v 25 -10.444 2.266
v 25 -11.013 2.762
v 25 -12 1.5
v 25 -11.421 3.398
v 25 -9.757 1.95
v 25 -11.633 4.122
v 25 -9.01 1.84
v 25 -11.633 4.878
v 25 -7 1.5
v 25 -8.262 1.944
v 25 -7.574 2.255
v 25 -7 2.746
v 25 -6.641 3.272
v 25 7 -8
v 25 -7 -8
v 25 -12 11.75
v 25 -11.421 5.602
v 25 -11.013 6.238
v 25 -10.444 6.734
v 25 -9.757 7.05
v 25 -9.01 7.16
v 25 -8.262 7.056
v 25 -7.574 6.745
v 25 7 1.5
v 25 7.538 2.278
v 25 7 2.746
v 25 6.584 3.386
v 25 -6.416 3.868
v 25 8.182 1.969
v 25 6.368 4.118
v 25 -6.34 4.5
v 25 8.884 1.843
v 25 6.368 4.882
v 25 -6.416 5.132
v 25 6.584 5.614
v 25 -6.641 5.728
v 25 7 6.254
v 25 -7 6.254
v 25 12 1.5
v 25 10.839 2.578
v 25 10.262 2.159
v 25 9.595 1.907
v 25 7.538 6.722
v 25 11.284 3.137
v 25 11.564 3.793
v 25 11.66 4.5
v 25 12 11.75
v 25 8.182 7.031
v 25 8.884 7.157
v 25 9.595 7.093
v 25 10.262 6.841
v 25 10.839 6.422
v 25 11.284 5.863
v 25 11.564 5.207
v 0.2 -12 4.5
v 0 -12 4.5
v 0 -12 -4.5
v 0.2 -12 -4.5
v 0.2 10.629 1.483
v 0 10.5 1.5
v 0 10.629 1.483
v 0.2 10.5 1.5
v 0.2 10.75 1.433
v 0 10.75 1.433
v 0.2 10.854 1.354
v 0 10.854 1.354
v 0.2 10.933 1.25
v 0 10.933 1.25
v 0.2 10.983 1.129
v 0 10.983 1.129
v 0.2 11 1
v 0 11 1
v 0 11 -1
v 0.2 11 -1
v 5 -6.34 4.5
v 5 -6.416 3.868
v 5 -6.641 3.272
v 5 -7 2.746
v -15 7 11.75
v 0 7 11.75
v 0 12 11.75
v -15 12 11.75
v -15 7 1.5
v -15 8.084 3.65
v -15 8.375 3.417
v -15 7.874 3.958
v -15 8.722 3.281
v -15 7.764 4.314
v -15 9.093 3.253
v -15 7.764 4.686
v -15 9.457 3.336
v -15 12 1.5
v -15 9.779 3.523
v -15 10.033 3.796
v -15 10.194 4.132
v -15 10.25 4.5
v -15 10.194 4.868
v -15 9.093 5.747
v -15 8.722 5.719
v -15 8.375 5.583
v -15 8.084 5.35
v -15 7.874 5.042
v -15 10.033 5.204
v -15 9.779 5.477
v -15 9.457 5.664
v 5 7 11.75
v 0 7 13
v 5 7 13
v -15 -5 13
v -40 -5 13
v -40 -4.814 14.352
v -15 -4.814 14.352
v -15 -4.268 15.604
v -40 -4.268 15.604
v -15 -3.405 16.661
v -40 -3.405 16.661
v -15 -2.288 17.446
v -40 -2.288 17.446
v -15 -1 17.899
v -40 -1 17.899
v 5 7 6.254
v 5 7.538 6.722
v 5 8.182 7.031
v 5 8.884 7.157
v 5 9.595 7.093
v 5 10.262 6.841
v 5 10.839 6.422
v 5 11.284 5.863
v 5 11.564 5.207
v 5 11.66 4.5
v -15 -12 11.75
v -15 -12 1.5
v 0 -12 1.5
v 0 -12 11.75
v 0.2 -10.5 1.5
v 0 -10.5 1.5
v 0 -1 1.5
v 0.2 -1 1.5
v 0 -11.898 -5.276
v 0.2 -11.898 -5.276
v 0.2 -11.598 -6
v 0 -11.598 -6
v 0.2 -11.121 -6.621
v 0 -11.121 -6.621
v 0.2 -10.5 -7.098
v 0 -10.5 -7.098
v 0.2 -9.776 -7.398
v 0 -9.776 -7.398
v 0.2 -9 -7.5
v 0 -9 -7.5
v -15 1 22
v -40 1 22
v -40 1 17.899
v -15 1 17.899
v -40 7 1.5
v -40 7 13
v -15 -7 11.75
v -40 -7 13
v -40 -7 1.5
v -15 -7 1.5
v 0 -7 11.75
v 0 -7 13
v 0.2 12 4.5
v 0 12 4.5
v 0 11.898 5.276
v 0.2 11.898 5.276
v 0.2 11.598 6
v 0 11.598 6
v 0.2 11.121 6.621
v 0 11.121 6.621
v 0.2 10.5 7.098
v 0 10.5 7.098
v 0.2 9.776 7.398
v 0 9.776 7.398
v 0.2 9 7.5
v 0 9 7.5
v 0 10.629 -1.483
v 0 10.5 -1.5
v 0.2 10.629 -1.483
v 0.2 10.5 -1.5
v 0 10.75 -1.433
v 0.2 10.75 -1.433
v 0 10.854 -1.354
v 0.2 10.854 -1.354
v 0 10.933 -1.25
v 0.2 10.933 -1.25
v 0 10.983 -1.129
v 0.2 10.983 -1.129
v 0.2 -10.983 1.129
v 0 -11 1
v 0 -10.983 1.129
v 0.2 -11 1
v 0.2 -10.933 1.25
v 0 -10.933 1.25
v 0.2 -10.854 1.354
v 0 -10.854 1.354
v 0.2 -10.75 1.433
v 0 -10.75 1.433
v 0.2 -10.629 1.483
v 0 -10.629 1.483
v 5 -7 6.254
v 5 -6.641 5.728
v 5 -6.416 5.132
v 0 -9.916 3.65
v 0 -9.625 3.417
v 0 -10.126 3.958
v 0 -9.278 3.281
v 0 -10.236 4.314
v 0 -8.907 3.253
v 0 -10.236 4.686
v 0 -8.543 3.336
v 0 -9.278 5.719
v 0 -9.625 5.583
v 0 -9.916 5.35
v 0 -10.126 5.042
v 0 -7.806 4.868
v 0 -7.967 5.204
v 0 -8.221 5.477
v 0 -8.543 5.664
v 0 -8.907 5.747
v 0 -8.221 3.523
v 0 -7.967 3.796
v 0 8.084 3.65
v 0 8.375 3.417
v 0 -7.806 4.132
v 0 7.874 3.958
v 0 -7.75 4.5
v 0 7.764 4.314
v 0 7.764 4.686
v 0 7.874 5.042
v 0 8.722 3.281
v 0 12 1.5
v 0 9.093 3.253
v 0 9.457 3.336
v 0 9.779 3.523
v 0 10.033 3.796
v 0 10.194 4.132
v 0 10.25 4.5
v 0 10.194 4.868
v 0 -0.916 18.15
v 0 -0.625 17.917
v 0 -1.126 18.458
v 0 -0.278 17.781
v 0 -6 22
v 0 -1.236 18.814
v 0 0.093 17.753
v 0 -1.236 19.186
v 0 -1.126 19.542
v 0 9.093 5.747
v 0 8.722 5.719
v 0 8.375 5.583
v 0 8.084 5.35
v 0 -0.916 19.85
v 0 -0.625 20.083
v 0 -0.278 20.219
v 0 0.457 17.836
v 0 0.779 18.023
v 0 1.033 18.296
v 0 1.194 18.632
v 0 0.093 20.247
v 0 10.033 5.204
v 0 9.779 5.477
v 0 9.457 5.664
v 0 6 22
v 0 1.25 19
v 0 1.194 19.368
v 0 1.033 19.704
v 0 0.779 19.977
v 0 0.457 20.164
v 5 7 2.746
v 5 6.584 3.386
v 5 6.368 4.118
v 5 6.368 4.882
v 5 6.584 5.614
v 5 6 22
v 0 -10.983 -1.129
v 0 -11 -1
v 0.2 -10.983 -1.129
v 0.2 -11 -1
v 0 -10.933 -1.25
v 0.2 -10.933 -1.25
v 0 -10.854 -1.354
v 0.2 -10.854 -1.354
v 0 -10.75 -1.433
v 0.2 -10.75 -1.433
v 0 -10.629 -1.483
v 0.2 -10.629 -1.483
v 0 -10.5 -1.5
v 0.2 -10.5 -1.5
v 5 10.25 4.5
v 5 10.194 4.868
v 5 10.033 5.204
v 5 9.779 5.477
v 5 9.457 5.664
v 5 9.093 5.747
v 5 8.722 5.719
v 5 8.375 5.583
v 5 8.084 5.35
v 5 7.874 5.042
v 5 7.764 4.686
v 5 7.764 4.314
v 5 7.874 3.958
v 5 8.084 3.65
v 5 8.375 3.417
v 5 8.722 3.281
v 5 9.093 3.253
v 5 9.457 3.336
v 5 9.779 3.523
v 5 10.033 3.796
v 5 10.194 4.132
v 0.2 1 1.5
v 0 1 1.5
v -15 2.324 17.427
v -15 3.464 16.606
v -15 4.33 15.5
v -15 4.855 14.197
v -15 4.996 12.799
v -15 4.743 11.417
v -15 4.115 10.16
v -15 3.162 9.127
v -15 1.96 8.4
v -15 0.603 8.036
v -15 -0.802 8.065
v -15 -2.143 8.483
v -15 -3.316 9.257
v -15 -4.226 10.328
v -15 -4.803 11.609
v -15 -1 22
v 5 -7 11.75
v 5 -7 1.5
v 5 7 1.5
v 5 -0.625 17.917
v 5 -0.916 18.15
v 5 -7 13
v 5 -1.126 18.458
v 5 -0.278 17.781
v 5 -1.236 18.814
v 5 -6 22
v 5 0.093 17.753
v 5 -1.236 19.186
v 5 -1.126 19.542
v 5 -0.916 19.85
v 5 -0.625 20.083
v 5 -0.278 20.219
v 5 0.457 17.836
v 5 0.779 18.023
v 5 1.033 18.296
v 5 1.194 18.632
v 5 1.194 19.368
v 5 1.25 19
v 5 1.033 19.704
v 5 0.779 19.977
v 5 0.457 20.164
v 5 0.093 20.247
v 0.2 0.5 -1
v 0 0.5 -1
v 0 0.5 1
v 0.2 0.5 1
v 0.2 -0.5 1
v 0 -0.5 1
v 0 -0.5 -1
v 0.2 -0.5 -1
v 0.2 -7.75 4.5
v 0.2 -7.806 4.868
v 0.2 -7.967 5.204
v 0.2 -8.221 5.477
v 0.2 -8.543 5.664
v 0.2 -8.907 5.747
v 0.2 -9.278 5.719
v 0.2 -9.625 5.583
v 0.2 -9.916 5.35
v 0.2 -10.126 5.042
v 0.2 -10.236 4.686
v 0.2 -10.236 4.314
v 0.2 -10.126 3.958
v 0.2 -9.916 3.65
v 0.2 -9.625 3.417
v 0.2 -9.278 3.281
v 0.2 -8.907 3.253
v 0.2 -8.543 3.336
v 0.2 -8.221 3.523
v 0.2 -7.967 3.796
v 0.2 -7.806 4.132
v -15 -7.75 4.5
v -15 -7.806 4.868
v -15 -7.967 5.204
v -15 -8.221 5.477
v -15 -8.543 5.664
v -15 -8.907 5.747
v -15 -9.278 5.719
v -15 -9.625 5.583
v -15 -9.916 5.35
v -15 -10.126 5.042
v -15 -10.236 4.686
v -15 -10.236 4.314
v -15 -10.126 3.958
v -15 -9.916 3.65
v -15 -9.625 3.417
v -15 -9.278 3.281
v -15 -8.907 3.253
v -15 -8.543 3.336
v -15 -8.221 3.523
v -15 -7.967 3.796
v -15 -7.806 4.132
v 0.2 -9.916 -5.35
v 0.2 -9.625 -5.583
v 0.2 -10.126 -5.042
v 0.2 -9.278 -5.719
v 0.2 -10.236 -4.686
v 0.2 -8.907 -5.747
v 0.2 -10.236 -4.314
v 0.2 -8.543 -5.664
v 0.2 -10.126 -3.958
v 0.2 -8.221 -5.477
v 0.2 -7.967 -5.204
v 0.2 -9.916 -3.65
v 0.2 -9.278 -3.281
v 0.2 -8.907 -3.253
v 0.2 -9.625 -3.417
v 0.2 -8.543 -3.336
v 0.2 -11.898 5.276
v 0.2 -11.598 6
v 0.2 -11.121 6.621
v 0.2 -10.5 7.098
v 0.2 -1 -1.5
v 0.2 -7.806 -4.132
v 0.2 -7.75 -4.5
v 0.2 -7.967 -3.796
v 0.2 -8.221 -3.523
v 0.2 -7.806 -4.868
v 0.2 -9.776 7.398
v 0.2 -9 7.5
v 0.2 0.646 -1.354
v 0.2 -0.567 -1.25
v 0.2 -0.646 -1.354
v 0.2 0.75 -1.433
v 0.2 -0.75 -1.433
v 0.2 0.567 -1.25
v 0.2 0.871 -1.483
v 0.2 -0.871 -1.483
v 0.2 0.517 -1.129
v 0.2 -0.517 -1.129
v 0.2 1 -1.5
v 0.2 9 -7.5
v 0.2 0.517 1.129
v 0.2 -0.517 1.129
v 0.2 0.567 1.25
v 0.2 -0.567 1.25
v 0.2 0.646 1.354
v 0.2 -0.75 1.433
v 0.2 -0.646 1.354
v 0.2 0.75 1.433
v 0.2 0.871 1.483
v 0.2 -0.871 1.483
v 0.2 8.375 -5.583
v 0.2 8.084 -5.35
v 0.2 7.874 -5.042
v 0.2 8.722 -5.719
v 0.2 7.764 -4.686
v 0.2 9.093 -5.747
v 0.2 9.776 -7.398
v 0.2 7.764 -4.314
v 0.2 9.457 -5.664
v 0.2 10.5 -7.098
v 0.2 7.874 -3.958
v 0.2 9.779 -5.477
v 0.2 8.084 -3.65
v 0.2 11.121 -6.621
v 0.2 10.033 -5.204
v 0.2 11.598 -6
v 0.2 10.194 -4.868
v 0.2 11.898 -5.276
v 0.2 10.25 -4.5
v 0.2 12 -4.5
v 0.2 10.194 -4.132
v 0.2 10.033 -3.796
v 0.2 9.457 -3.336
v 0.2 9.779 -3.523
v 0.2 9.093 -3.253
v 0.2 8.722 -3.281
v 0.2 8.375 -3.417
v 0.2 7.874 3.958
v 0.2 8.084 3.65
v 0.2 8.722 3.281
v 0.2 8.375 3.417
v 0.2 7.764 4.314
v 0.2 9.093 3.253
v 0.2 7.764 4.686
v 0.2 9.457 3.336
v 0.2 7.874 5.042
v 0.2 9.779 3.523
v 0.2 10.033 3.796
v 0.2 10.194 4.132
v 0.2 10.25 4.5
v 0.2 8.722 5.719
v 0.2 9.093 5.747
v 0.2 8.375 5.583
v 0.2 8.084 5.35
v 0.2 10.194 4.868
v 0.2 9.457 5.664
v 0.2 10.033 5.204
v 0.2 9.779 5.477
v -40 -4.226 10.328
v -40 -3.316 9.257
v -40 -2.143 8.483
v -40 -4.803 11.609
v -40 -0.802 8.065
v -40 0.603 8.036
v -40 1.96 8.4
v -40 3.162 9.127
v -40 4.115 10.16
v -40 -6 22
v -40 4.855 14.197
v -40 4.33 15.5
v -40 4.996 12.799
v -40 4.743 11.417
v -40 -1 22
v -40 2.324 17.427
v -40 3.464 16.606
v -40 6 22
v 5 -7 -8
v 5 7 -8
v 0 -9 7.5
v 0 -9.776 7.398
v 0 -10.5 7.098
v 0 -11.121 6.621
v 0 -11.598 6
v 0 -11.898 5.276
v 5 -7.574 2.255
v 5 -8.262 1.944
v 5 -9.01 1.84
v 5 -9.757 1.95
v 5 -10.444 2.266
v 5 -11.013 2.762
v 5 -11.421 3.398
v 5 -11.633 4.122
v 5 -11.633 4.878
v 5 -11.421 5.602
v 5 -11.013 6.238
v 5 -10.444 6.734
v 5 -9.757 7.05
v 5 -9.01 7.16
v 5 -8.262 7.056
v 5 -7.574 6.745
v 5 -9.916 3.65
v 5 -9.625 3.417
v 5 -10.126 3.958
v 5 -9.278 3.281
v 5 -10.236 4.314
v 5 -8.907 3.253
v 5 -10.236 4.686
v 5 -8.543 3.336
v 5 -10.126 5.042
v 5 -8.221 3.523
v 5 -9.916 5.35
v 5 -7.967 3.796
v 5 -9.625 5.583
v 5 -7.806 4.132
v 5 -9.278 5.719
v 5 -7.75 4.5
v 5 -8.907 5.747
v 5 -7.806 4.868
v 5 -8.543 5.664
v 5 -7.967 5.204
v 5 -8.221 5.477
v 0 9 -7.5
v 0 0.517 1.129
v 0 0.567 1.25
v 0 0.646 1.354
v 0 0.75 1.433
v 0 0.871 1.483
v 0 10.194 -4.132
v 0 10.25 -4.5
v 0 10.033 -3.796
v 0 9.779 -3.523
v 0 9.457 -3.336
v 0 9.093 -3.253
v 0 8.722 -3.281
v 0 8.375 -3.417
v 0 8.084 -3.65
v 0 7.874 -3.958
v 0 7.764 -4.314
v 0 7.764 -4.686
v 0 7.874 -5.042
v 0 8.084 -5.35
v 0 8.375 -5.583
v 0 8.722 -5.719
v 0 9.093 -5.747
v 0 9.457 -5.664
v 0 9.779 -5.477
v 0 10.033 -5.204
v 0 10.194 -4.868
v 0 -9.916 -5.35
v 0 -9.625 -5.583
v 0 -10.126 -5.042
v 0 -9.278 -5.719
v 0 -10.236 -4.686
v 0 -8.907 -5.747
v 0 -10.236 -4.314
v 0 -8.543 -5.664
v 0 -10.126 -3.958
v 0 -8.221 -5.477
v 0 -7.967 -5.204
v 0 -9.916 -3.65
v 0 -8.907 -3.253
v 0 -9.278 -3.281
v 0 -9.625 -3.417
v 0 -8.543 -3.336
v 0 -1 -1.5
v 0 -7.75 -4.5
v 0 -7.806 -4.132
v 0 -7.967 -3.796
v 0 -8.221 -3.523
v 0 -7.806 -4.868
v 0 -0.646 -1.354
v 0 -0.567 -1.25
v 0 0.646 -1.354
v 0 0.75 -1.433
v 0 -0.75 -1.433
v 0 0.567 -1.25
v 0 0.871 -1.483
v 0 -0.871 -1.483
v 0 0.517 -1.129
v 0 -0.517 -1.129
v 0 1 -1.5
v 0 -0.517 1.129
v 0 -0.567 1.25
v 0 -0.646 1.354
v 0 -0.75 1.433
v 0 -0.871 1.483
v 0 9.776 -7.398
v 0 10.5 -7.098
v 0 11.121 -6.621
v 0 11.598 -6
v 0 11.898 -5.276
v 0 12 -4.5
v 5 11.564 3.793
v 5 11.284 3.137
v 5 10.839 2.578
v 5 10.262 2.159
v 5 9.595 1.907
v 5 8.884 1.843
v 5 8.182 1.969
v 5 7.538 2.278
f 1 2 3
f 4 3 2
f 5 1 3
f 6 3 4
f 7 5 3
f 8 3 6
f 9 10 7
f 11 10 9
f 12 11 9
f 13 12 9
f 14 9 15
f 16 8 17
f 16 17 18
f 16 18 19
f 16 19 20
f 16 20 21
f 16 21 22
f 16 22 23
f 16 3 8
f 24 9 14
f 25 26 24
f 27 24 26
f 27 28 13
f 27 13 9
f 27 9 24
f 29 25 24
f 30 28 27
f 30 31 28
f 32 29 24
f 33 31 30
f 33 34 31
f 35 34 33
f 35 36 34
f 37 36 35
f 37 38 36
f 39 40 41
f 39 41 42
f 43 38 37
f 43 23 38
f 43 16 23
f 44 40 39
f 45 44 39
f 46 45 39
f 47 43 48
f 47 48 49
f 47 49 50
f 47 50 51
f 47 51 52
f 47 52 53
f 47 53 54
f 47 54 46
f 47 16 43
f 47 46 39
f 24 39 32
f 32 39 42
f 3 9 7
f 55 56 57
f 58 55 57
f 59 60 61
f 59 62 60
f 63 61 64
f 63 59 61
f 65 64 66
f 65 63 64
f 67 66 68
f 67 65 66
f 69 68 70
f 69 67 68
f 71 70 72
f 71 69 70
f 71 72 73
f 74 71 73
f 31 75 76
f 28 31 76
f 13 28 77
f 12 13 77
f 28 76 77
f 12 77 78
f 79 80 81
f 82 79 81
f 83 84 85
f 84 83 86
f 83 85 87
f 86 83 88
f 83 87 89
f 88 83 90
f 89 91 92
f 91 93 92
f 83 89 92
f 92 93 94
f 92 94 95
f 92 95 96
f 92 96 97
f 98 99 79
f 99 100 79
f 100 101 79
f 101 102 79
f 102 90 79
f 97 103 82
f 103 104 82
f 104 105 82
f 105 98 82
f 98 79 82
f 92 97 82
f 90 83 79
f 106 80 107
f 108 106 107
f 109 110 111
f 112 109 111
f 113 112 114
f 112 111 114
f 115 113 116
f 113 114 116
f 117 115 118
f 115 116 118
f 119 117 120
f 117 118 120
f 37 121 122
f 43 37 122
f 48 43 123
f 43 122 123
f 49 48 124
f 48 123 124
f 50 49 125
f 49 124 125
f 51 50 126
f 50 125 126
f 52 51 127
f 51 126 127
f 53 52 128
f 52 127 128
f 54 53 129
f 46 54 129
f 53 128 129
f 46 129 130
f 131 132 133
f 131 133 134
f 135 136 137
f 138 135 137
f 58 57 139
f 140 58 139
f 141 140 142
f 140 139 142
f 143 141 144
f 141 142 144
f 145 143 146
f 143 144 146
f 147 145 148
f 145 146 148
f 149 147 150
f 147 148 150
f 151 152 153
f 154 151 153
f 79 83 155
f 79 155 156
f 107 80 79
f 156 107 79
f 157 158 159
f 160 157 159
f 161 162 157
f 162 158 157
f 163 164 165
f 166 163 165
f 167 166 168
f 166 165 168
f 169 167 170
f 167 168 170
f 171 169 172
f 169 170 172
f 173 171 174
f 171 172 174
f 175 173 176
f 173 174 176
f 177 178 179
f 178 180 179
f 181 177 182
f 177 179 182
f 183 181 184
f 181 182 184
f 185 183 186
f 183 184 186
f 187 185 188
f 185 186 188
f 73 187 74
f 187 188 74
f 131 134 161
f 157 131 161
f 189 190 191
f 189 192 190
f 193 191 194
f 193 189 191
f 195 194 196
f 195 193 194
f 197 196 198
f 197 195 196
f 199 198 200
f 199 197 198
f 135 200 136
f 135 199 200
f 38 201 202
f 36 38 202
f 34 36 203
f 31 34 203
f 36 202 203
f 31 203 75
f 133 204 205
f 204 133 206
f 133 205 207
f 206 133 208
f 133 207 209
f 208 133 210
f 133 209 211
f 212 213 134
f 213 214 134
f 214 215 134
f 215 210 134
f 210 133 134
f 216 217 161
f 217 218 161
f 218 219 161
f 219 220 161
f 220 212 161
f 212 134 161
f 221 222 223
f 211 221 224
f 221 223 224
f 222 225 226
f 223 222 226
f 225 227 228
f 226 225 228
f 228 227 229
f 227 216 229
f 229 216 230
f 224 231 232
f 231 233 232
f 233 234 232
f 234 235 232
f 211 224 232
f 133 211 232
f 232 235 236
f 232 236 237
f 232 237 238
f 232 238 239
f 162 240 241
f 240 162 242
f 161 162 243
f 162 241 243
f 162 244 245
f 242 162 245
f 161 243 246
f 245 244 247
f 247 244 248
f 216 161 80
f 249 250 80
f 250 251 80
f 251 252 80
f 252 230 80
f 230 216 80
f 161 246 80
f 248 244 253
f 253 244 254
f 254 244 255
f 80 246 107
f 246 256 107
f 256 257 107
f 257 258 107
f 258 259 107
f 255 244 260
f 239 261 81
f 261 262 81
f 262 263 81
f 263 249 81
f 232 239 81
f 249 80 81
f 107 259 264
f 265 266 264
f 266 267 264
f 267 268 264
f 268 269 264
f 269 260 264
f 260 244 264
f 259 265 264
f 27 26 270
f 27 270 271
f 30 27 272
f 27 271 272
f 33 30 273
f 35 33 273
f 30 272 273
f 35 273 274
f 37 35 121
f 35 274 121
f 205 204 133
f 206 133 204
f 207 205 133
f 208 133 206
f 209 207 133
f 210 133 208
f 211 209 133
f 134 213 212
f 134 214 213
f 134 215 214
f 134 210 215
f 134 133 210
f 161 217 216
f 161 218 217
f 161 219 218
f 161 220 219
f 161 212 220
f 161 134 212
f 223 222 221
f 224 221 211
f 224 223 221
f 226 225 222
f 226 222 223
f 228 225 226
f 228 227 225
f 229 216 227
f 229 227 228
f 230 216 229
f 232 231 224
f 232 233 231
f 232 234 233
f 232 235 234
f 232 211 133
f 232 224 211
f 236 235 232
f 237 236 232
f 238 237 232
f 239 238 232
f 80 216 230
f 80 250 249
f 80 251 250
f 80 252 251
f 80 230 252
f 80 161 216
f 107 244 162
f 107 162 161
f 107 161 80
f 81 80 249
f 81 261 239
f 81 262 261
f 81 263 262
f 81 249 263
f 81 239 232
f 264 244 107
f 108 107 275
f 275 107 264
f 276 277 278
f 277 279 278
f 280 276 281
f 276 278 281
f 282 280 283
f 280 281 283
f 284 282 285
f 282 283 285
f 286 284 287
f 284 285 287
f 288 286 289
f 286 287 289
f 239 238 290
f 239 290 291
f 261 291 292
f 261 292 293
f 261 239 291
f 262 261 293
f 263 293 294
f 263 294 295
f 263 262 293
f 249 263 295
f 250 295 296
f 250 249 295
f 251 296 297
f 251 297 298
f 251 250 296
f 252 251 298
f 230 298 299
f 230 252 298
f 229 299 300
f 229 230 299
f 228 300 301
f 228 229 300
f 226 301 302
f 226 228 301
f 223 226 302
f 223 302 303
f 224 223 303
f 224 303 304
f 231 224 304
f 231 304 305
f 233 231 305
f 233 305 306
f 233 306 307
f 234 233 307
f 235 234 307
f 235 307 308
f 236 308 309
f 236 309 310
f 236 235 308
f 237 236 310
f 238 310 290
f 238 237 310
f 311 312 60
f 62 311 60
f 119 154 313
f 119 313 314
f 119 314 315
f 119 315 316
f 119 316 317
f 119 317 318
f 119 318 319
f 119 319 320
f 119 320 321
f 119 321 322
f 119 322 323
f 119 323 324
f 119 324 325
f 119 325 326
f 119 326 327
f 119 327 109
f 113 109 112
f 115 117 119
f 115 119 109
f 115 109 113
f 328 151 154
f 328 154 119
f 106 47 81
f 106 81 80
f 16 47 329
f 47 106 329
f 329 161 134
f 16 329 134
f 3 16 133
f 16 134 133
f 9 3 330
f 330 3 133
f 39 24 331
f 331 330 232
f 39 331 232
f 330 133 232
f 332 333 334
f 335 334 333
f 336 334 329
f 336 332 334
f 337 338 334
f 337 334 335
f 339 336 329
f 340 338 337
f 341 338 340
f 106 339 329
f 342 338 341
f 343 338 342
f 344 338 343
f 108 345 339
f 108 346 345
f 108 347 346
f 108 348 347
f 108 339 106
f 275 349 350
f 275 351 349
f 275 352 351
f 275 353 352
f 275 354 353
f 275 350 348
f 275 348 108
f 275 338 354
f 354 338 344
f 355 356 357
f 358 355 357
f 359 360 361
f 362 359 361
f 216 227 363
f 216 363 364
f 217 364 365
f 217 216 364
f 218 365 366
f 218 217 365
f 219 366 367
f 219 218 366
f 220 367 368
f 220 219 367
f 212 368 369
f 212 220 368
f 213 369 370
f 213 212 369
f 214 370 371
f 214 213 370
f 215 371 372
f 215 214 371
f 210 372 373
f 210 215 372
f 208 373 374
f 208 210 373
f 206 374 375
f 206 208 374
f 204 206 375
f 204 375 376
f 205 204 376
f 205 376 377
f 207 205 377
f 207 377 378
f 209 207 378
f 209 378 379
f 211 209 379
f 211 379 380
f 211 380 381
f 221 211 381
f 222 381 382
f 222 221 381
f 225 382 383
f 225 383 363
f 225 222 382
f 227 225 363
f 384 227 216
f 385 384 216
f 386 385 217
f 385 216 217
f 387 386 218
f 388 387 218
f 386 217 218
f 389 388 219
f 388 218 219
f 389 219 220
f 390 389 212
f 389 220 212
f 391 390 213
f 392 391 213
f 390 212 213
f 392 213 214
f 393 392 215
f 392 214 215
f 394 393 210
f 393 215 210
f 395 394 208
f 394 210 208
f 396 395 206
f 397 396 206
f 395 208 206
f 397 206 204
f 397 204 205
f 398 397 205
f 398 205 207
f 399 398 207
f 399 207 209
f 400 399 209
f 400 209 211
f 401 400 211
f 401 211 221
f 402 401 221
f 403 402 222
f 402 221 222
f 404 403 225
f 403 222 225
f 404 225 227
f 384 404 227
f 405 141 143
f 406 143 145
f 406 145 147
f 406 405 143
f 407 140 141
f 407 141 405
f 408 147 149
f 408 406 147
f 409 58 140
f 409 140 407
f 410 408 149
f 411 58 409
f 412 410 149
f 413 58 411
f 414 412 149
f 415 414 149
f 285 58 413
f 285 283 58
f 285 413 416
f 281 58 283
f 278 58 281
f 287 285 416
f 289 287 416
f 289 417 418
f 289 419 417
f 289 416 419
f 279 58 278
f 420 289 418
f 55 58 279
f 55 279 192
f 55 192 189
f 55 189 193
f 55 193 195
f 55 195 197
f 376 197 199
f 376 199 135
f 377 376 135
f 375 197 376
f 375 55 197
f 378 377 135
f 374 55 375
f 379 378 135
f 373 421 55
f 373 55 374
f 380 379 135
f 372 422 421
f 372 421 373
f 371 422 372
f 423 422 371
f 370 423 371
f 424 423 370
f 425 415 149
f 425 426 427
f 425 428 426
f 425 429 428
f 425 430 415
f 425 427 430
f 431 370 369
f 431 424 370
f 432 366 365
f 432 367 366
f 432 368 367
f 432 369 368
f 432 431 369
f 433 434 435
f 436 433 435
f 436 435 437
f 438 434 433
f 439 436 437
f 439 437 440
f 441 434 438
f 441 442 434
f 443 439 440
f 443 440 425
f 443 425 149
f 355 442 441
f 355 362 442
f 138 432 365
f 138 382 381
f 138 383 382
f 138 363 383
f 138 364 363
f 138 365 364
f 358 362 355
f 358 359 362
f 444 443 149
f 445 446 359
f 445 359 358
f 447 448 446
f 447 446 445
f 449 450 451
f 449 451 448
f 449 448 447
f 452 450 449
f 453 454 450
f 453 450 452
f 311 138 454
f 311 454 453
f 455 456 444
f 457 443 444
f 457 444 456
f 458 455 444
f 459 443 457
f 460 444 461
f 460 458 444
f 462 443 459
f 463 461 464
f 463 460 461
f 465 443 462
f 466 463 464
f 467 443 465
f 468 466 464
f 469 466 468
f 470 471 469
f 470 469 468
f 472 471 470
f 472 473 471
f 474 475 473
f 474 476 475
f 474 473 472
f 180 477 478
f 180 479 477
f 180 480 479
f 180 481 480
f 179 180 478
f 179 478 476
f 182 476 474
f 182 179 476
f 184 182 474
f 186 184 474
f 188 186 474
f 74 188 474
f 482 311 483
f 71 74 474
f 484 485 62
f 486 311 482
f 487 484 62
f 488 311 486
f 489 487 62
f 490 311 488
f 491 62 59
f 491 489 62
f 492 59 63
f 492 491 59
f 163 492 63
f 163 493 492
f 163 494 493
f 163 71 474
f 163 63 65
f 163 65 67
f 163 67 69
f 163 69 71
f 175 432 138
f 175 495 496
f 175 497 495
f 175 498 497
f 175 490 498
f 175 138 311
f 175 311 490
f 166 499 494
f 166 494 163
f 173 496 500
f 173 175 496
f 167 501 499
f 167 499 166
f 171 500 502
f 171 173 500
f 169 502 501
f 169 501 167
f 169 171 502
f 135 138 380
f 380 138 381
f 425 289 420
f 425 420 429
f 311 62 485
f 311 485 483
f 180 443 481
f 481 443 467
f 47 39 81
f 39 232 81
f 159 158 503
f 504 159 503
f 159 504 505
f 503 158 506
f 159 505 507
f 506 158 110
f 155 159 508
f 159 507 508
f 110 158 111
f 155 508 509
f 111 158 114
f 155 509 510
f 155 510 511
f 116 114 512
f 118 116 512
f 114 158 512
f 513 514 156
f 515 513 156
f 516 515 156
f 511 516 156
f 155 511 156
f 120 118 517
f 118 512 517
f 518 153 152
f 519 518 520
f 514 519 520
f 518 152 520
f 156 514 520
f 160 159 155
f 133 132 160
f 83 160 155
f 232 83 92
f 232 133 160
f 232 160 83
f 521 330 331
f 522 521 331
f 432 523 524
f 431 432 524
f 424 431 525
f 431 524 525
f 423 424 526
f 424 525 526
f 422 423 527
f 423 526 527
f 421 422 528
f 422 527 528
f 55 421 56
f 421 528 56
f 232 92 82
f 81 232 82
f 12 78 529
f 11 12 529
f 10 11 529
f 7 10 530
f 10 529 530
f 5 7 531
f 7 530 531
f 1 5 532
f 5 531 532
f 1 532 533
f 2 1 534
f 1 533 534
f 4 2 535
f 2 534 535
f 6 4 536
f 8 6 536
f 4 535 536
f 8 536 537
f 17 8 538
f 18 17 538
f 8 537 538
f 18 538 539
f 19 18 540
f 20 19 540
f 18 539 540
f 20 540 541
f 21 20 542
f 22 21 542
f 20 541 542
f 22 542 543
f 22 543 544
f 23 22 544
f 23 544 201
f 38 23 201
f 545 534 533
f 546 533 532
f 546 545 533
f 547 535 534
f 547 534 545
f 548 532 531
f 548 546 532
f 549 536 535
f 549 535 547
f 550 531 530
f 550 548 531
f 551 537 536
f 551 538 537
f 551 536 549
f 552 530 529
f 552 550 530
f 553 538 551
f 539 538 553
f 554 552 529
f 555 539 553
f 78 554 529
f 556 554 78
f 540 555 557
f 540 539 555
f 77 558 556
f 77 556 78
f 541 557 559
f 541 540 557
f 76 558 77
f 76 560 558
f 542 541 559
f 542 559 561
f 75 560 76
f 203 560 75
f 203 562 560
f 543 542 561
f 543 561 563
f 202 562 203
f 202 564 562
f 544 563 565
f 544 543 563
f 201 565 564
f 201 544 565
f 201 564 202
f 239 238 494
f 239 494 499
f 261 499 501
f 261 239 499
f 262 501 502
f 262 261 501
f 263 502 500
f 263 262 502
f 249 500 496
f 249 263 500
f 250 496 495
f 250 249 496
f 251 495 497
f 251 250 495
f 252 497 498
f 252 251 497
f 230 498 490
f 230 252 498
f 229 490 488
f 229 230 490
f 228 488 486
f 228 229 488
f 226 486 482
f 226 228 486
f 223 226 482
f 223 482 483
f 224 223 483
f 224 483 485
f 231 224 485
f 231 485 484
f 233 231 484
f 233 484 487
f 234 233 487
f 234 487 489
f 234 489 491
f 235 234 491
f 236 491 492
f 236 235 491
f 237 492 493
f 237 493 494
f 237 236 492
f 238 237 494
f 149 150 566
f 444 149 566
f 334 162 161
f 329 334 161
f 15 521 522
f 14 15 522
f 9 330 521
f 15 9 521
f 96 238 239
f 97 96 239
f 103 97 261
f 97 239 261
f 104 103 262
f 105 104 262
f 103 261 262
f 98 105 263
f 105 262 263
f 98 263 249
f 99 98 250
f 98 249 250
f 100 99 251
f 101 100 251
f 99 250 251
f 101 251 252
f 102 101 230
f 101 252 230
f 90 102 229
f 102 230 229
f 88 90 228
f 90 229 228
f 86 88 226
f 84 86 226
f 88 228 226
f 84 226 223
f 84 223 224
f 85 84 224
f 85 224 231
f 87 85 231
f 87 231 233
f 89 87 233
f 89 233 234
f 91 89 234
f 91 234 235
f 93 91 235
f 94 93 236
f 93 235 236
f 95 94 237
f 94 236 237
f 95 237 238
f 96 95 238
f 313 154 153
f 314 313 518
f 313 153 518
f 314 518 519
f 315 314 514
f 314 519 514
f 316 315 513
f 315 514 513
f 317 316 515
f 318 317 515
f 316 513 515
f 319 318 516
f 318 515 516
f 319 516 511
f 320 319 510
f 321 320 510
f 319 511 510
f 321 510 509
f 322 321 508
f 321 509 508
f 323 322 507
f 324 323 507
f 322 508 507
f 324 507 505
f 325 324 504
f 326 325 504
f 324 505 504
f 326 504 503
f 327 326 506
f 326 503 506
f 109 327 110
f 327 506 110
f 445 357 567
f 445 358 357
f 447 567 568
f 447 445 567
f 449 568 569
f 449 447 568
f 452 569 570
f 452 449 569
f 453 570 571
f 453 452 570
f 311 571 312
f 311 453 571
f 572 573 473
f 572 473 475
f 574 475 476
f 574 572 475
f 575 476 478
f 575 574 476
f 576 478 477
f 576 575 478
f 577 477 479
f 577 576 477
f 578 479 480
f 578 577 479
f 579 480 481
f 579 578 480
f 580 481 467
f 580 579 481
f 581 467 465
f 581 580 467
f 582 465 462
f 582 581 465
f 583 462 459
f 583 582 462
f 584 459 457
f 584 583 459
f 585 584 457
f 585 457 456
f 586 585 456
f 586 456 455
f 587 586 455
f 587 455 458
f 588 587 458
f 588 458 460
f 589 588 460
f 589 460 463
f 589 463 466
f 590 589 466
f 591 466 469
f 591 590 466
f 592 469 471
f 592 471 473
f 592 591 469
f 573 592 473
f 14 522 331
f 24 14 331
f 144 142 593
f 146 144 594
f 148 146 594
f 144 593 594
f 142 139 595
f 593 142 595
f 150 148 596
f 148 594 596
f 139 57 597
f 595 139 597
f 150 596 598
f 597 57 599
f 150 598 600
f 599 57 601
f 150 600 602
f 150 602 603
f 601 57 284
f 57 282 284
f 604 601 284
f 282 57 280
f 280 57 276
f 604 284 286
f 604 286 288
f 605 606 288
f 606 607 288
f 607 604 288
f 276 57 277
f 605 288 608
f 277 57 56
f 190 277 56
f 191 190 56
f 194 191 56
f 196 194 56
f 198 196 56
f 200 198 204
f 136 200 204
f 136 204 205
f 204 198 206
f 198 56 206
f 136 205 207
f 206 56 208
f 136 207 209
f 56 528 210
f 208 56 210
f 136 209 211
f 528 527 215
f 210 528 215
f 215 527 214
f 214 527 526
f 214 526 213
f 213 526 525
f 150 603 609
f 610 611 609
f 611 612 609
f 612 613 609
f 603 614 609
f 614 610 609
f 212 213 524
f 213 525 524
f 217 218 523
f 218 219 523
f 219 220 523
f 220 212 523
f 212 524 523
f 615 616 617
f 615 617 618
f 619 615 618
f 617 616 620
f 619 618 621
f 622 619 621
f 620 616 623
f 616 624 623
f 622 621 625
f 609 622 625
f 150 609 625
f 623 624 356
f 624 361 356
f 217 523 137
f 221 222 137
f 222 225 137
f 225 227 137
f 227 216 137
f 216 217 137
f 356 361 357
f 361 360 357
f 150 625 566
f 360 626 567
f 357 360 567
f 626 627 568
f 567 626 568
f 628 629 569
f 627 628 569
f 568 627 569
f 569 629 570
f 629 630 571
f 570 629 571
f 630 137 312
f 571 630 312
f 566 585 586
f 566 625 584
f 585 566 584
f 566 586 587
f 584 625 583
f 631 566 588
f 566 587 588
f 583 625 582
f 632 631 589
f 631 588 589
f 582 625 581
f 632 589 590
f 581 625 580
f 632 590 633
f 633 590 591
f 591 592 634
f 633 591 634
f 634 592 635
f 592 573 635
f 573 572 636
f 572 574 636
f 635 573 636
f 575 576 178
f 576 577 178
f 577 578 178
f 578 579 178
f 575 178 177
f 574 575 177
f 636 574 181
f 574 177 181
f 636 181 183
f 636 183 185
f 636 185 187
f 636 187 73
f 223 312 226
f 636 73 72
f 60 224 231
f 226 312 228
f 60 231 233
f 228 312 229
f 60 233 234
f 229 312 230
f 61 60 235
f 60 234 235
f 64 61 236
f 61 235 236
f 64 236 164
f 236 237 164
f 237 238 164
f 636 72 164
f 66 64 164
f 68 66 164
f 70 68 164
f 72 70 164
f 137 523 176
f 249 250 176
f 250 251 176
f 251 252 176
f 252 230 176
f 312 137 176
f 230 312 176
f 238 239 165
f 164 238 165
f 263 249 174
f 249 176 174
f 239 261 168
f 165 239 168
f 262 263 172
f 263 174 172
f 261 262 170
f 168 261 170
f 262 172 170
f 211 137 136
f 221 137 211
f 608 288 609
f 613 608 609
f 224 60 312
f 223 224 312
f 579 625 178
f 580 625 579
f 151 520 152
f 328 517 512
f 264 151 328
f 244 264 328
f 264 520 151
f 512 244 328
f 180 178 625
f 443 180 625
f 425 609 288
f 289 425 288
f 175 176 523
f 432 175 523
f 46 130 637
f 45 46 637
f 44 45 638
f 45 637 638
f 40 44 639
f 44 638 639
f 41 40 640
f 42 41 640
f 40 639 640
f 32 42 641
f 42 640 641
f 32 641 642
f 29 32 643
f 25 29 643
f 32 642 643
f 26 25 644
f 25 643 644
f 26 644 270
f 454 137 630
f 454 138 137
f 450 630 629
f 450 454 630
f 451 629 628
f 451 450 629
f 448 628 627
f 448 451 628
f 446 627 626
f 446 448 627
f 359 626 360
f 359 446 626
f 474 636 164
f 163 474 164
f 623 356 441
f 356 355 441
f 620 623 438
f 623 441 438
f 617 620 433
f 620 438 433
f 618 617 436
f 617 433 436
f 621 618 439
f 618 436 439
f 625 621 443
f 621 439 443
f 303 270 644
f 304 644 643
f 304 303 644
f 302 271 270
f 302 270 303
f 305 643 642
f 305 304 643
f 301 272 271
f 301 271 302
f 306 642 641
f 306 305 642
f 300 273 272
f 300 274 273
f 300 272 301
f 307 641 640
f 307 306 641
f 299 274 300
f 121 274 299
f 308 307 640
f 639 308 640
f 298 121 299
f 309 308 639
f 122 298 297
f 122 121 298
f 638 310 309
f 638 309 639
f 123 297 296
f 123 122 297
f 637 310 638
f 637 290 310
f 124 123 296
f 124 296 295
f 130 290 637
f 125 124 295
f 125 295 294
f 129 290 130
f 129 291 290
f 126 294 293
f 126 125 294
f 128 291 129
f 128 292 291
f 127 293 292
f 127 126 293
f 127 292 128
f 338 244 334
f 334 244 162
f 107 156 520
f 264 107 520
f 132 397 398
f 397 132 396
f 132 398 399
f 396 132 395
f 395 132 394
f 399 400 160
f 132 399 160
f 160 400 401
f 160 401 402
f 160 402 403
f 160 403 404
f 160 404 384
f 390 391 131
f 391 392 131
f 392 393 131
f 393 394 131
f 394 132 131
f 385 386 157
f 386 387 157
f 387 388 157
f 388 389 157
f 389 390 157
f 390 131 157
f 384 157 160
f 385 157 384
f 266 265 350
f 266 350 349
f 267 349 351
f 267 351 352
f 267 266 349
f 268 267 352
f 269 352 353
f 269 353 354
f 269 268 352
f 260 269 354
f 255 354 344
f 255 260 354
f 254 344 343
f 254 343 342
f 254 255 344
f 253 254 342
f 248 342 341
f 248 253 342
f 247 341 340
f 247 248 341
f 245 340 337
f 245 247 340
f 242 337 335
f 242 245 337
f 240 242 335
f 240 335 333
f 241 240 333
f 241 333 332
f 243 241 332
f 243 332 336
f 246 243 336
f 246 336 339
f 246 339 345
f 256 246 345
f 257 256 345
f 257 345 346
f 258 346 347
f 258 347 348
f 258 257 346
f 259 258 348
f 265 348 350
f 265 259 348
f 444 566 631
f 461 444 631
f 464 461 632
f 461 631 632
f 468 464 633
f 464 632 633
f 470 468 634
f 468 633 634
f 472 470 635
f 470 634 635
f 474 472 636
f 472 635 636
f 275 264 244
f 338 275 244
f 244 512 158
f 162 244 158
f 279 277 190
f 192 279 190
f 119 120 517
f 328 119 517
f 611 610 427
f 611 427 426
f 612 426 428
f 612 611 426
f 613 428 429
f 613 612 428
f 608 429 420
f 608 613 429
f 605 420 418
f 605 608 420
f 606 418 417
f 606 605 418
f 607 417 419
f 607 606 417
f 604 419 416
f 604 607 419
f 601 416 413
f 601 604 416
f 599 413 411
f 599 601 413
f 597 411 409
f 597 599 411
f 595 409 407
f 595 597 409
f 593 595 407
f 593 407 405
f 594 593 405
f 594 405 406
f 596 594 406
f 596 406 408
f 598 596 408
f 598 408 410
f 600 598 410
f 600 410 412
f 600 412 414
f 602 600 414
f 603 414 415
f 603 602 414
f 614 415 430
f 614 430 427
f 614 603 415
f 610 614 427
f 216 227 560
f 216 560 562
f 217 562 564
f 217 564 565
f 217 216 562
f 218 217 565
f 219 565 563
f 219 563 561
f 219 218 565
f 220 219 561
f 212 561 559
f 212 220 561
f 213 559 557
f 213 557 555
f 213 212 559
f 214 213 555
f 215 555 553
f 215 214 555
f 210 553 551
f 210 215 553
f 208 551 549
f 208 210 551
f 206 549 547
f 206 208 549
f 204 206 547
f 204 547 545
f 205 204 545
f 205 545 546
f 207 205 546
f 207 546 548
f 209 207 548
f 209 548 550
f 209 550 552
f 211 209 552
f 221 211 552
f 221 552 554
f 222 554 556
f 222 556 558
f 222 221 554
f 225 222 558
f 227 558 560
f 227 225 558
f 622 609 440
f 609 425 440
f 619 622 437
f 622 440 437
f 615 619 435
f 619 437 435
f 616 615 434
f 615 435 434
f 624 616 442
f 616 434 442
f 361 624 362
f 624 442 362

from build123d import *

# Parameters (mm, degrees)
F0_R      = 1.25
F1_DEPTH  = 40
F0_W      = 5
F0_H      = 10.25
F2_DEPTH  = 15
F4_DEPTH  = 25
F5_DEPTH  = 25
F6_R      = 1.25
F6_W      = 1
F6_H      = 1.5
F7_DEPTH  = 0.2
F8_R      = 0.5
F9_DEPTH  = 5
F10_W     = 14
F10_H     = 9.5
F11_DEPTH = 20


with BuildPart() as f1:
    # F0 (on Right) → F1 (new body)
    with BuildSketch(Plane.YZ):
        Polygon((-7, 11.75), (-7, 1.5), (7, 1.5), (7, 11.75), (7, 13), (6, 22), (-6, 22), (-7, 13), align=None)
        with Locations((0, 19)):
            Circle(F0_R, mode=Mode.SUBTRACT)
        with Locations((0, 19)):
            Circle(F0_R)
    extrude(amount=-F1_DEPTH)

    # F0 (on Right) → F2 (join)
    with BuildSketch(Plane.YZ):
        with Locations((-9.5, 6.625)):
            Rectangle(F0_W, F0_H)
        with Locations((-9, 4.5)):
            Circle(F0_R, mode=Mode.SUBTRACT)
        with Locations((9.5, 6.625)):
            Rectangle(F0_W, F0_H)
        with Locations((9, 4.5)):
            Circle(F0_R, mode=Mode.SUBTRACT)
    extrude(amount=-F2_DEPTH)

    # F3 (on face) → F4 (cut)
    with BuildSketch(Plane(origin=(-40, 0, 0), x_dir=(0, -1, 0), z_dir=(-1, 0, 0))):
        with BuildLine():
            ThreePointArc((-1, 17.898979), (-3.162278, 9.127017), (5, 13))
            ThreePointArc((5, 13), (3.872983, 16.162278), (1, 17.898979))
            ThreePointArc((1, 17.898979), (0, 18), (-1, 17.898979))
        make_face()
        with BuildLine():
            ThreePointArc((-1, 17.898979), (0, 18), (1, 17.898979))
            Line((1, 17.898979), (1, 22))
            Line((1, 22), (-1, 22))
            Line((-1, 22), (-1, 17.898979))
        make_face()
    extrude(amount=-F4_DEPTH, mode=Mode.SUBTRACT)

    # F3 (on face) → F5 (cut)
    with BuildSketch(Plane(origin=(-40, 0, 0), x_dir=(0, -1, 0), z_dir=(-1, 0, 0))):
        with BuildLine():
            ThreePointArc((-1, 17.898979), (0, 18), (1, 17.898979))
            Line((1, 17.898979), (1, 22))
            Line((1, 22), (-1, 22))
            Line((-1, 22), (-1, 17.898979))
        make_face()
        with BuildLine():
            ThreePointArc((-1, 17.898979), (-3.162278, 9.127017), (5, 13))
            ThreePointArc((5, 13), (3.872983, 16.162278), (1, 17.898979))
            ThreePointArc((1, 17.898979), (0, 18), (-1, 17.898979))
        make_face()
    extrude(amount=-F5_DEPTH, mode=Mode.SUBTRACT)


with BuildPart() as f7:
    # F6 (on face) → F7 (new body)
    with BuildSketch(Plane.YZ):
        with BuildLine():
            Line((-12, 4.5), (-12, 1.5))
            Line((-12, 1.5), (-11, 1.5))
            Line((-11, 1.5), (-0.5, 1.5))
            Line((-0.5, 1.5), (0.5, 1.5))
            Line((0.5, 1.5), (11, 1.5))
            Line((11, 1.5), (12, 1.5))
            Line((12, 1.5), (12, 4.5))
            ThreePointArc((12, 4.5), (11.12132, 6.62132), (9, 7.5))
            Line((9, 7.5), (-9, 7.5))
            ThreePointArc((-9, 7.5), (-11.12132, 6.62132), (-12, 4.5))
        make_face()
        with Locations((-9, 4.5)):
            Circle(F6_R, mode=Mode.SUBTRACT)
        with Locations((9, 4.5)):
            Circle(F6_R, mode=Mode.SUBTRACT)
        with Locations((-11.5, 0.75)):
            Rectangle(F6_W, F6_H)
        with Locations((-11.5, -0.75)):
            Rectangle(F6_W, F6_H)
        with Locations((0, 0.75)):
            Rectangle(F6_W, F6_H)
        with Locations((0, -0.75)):
            Rectangle(F6_W, F6_H)
        with Locations((11.5, 0.75)):
            Rectangle(F6_W, F6_H)
        with Locations((11.5, -0.75)):
            Rectangle(F6_W, F6_H)
        with BuildLine():
            Line((-11, -1.5), (-12, -1.5))
            Line((-12, -1.5), (-12, -4.5))
            ThreePointArc((-12, -4.5), (-11.12132, -6.62132), (-9, -7.5))
            Line((-9, -7.5), (9, -7.5))
            ThreePointArc((9, -7.5), (11.12132, -6.62132), (12, -4.5))
            Line((12, -4.5), (12, -1.5))
            Line((12, -1.5), (11, -1.5))
            Line((11, -1.5), (0.5, -1.5))
            Line((0.5, -1.5), (-0.5, -1.5))
            Line((-0.5, -1.5), (-11, -1.5))
        make_face()
        with Locations((-9, -4.5)):
            Circle(F6_R, mode=Mode.SUBTRACT)
        with Locations((9, -4.5)):
            Circle(F6_R, mode=Mode.SUBTRACT)
    extrude(amount=F7_DEPTH)

    # F8
    f8_edges = [f7.edges().sort_by_distance(p)[0] for p in [
        (0.1, -0.5, 1.5),
        (0.1, -11, 1.5),
        (0.1, -0.5, -1.5),
        (0.1, -11, -1.5),
        (0.1, 0.5, -1.5),
        (0.1, 11, 1.5),
        (0.1, 0.5, 1.5),
        (0.1, 11, -1.5),
    ]]
    fillet(f8_edges, radius=F8_R)


with BuildPart() as f9:
    # F0 (on Right) → F9 (new body)
    with BuildSketch(Plane.YZ):
        with Locations((-9.5, 6.625)):
            Rectangle(F0_W, F0_H)
        with Locations((-9, 4.5)):
            Circle(F0_R, mode=Mode.SUBTRACT)
        Polygon((-7, 11.75), (-7, 1.5), (7, 1.5), (7, 11.75), (7, 13), (6, 22), (-6, 22), (-7, 13), align=None)
        with Locations((0, 19)):
            Circle(F0_R, mode=Mode.SUBTRACT)
        with Locations((9.5, 6.625)):
            Rectangle(F0_W, F0_H)
        with Locations((9, 4.5)):
            Circle(F0_R, mode=Mode.SUBTRACT)
    extrude(amount=F9_DEPTH)

    # F10 (on face) → F11 (join)
    with BuildSketch(Plane.YZ.offset(5)):
        with Locations((0, -3.25)):
            Rectangle(F10_W, F10_H)
        with BuildLine():
            Line((7, 11.75), (-7, 11.75))
            Line((-7, 11.75), (-7, 6.253739))
            ThreePointArc((-7, 6.253739), (-6.510462, 5.43691), (-6.34, 4.5))
            ThreePointArc((-6.34, 4.5), (-6.510462, 3.56309), (-7, 2.746261))
            Line((-7, 2.746261), (-7, 1.5))
            Line((-7, 1.5), (7, 1.5))
            Line((7, 1.5), (7, 2.746261))
            ThreePointArc((7, 2.746261), (6.34, 4.5), (7, 6.253739))
            Line((7, 6.253739), (7, 11.75))
        make_face()
        with BuildLine():
            Line((-7, 6.253739), (-7, 11.75))
            Line((-7, 11.75), (-12, 11.75))
            Line((-12, 11.75), (-12, 1.5))
            Line((-12, 1.5), (-7, 1.5))
            Line((-7, 1.5), (-7, 2.746261))
            ThreePointArc((-7, 2.746261), (-11.66, 4.5), (-7, 6.253739))
        make_face()
        with BuildLine():
            Line((12, 11.75), (7, 11.75))
            Line((7, 11.75), (7, 6.253739))
            ThreePointArc((7, 6.253739), (9.93691, 6.989538), (11.66, 4.5))
            ThreePointArc((11.66, 4.5), (9.93691, 2.010462), (7, 2.746261))
            Line((7, 2.746261), (7, 1.5))
            Line((7, 1.5), (12, 1.5))
            Line((12, 1.5), (12, 11.75))
        make_face()
    extrude(amount=F11_DEPTH)


solid = Compound([f1.part, f7.part, f9.part])
